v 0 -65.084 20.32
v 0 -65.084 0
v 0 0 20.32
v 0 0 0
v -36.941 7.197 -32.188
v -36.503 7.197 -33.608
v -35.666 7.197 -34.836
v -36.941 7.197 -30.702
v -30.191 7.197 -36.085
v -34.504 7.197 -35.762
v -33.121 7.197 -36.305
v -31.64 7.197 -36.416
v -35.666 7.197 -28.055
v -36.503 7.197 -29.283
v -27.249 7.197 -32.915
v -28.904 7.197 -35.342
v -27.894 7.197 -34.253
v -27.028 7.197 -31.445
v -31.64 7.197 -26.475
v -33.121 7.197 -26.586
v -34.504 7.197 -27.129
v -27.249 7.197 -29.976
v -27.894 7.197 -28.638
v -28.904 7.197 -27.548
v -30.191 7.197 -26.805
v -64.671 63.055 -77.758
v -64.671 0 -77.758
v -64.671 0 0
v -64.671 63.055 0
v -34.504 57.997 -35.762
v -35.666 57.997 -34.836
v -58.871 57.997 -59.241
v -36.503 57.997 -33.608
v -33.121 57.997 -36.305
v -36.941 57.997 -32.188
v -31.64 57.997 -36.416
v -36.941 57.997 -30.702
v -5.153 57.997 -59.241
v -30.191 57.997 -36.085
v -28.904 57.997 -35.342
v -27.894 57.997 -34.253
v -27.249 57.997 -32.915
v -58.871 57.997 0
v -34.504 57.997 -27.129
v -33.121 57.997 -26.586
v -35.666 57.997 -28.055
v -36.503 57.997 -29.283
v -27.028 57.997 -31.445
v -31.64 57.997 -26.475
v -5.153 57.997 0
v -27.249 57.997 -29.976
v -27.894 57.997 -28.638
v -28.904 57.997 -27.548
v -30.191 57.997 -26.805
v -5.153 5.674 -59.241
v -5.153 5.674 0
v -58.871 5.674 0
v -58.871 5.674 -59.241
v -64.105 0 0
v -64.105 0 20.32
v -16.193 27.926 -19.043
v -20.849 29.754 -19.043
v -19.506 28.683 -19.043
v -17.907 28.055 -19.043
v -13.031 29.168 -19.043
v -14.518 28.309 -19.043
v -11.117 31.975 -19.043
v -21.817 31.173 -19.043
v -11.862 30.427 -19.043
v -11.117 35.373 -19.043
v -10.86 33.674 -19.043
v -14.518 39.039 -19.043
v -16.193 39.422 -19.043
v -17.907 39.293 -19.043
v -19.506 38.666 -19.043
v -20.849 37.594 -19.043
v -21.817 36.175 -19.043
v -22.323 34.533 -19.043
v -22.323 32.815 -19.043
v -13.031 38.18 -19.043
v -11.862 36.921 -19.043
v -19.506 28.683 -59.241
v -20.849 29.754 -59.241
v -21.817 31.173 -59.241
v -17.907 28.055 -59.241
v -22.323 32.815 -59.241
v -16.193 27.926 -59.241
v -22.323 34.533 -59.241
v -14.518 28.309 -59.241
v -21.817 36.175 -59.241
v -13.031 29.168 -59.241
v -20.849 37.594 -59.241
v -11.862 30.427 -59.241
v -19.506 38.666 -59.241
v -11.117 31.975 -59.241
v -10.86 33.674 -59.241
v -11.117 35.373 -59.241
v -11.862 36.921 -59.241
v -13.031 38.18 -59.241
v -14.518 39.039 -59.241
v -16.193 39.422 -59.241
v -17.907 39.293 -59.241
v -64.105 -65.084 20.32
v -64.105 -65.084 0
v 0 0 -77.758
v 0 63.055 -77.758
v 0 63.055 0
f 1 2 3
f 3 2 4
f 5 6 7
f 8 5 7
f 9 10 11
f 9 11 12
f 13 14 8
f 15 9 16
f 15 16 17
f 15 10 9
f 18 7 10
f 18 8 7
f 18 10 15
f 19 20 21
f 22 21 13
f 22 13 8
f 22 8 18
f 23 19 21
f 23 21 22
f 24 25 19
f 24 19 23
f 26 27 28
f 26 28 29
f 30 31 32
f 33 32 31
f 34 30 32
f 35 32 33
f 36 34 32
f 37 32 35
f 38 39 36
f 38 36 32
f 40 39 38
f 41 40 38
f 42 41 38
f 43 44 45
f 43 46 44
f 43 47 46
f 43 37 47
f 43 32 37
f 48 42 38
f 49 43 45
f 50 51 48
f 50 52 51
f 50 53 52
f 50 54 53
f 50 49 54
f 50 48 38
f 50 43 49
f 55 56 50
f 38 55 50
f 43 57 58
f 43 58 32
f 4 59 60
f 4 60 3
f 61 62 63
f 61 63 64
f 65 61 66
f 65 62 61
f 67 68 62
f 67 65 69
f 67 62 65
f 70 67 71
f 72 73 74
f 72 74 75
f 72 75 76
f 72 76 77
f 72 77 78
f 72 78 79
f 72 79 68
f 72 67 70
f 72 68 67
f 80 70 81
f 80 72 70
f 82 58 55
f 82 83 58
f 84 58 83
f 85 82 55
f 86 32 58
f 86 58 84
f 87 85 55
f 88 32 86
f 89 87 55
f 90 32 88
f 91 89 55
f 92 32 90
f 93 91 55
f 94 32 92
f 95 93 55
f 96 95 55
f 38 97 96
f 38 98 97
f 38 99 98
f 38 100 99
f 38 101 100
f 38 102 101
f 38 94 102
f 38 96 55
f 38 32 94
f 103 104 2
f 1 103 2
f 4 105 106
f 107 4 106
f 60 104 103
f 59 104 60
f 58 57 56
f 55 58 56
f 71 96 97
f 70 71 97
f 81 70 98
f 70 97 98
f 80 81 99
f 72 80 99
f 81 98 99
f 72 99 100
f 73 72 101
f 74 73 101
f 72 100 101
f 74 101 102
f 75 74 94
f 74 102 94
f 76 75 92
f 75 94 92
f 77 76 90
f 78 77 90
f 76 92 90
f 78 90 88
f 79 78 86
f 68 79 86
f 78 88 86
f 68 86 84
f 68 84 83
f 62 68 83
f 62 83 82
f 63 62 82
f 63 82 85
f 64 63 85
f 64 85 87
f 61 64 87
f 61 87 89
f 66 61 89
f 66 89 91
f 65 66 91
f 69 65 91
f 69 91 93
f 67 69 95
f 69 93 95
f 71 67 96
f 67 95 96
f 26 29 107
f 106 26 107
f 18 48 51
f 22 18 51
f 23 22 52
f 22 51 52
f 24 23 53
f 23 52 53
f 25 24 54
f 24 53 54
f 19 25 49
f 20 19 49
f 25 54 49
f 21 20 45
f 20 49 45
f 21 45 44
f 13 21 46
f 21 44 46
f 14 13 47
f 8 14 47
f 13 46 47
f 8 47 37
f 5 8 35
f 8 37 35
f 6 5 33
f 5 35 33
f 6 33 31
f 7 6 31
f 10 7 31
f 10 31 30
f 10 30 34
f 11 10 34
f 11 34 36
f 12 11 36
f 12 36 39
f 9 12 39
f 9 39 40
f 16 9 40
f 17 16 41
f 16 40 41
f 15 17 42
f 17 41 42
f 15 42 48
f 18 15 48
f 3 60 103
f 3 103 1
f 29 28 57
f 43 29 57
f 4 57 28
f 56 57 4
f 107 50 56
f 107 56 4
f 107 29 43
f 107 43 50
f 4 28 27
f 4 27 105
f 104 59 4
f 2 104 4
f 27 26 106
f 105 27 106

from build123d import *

# Parameters (mm, degrees)
F0_W     = 64.670675
F0_H     = 63.054867
F1_DEPTH = 77.758297
F2_W     = 53.718403
F2_H     = 52.32276
F3_DEPTH = 59.240542
F4_R     = 4.984457
F5_DEPTH = 50.8
F6_R     = 5.763663
F7_DEPTH = 40.197752
F8_W     = 64.104669
F8_H     = 65.083817
F9_DEPTH = 20.32


with BuildPart() as f1:
    # F0 (on Top) → F1 (new body)
    with BuildSketch(Plane.XY):
        with Locations((-32.335338, 31.527433)):
            Rectangle(F0_W, F0_H)
    extrude(amount=-F1_DEPTH)

    # F2 (on face) → F3 (cut)
    with BuildSketch(Plane.XY):
        with Locations((-32.012037, 31.835213)):
            Rectangle(F2_W, F2_H)
    extrude(amount=-F3_DEPTH, mode=Mode.SUBTRACT)

    # F4 (on face) → F5 (join)
    with BuildSketch(Plane.XZ.offset(-57.996593)):
        with Locations((-32.012038, -31.445377)):
            Circle(F4_R)
    extrude(amount=F5_DEPTH)

    # F6 (on face) → F7 (join)
    with BuildSketch(Plane.XY.offset(-59.240542)):
        with Locations((-16.624123, 33.674024)):
            Circle(F6_R)
    extrude(amount=F7_DEPTH)


with BuildPart() as f9:
    # F8 (on Top) → F9 (new body)
    with BuildSketch(Plane.XY):
        with Locations((-32.052335, -32.541908)):
            Rectangle(F8_W, F8_H)
    extrude(amount=F9_DEPTH)


solid = Compound([f1.part, f9.part])
